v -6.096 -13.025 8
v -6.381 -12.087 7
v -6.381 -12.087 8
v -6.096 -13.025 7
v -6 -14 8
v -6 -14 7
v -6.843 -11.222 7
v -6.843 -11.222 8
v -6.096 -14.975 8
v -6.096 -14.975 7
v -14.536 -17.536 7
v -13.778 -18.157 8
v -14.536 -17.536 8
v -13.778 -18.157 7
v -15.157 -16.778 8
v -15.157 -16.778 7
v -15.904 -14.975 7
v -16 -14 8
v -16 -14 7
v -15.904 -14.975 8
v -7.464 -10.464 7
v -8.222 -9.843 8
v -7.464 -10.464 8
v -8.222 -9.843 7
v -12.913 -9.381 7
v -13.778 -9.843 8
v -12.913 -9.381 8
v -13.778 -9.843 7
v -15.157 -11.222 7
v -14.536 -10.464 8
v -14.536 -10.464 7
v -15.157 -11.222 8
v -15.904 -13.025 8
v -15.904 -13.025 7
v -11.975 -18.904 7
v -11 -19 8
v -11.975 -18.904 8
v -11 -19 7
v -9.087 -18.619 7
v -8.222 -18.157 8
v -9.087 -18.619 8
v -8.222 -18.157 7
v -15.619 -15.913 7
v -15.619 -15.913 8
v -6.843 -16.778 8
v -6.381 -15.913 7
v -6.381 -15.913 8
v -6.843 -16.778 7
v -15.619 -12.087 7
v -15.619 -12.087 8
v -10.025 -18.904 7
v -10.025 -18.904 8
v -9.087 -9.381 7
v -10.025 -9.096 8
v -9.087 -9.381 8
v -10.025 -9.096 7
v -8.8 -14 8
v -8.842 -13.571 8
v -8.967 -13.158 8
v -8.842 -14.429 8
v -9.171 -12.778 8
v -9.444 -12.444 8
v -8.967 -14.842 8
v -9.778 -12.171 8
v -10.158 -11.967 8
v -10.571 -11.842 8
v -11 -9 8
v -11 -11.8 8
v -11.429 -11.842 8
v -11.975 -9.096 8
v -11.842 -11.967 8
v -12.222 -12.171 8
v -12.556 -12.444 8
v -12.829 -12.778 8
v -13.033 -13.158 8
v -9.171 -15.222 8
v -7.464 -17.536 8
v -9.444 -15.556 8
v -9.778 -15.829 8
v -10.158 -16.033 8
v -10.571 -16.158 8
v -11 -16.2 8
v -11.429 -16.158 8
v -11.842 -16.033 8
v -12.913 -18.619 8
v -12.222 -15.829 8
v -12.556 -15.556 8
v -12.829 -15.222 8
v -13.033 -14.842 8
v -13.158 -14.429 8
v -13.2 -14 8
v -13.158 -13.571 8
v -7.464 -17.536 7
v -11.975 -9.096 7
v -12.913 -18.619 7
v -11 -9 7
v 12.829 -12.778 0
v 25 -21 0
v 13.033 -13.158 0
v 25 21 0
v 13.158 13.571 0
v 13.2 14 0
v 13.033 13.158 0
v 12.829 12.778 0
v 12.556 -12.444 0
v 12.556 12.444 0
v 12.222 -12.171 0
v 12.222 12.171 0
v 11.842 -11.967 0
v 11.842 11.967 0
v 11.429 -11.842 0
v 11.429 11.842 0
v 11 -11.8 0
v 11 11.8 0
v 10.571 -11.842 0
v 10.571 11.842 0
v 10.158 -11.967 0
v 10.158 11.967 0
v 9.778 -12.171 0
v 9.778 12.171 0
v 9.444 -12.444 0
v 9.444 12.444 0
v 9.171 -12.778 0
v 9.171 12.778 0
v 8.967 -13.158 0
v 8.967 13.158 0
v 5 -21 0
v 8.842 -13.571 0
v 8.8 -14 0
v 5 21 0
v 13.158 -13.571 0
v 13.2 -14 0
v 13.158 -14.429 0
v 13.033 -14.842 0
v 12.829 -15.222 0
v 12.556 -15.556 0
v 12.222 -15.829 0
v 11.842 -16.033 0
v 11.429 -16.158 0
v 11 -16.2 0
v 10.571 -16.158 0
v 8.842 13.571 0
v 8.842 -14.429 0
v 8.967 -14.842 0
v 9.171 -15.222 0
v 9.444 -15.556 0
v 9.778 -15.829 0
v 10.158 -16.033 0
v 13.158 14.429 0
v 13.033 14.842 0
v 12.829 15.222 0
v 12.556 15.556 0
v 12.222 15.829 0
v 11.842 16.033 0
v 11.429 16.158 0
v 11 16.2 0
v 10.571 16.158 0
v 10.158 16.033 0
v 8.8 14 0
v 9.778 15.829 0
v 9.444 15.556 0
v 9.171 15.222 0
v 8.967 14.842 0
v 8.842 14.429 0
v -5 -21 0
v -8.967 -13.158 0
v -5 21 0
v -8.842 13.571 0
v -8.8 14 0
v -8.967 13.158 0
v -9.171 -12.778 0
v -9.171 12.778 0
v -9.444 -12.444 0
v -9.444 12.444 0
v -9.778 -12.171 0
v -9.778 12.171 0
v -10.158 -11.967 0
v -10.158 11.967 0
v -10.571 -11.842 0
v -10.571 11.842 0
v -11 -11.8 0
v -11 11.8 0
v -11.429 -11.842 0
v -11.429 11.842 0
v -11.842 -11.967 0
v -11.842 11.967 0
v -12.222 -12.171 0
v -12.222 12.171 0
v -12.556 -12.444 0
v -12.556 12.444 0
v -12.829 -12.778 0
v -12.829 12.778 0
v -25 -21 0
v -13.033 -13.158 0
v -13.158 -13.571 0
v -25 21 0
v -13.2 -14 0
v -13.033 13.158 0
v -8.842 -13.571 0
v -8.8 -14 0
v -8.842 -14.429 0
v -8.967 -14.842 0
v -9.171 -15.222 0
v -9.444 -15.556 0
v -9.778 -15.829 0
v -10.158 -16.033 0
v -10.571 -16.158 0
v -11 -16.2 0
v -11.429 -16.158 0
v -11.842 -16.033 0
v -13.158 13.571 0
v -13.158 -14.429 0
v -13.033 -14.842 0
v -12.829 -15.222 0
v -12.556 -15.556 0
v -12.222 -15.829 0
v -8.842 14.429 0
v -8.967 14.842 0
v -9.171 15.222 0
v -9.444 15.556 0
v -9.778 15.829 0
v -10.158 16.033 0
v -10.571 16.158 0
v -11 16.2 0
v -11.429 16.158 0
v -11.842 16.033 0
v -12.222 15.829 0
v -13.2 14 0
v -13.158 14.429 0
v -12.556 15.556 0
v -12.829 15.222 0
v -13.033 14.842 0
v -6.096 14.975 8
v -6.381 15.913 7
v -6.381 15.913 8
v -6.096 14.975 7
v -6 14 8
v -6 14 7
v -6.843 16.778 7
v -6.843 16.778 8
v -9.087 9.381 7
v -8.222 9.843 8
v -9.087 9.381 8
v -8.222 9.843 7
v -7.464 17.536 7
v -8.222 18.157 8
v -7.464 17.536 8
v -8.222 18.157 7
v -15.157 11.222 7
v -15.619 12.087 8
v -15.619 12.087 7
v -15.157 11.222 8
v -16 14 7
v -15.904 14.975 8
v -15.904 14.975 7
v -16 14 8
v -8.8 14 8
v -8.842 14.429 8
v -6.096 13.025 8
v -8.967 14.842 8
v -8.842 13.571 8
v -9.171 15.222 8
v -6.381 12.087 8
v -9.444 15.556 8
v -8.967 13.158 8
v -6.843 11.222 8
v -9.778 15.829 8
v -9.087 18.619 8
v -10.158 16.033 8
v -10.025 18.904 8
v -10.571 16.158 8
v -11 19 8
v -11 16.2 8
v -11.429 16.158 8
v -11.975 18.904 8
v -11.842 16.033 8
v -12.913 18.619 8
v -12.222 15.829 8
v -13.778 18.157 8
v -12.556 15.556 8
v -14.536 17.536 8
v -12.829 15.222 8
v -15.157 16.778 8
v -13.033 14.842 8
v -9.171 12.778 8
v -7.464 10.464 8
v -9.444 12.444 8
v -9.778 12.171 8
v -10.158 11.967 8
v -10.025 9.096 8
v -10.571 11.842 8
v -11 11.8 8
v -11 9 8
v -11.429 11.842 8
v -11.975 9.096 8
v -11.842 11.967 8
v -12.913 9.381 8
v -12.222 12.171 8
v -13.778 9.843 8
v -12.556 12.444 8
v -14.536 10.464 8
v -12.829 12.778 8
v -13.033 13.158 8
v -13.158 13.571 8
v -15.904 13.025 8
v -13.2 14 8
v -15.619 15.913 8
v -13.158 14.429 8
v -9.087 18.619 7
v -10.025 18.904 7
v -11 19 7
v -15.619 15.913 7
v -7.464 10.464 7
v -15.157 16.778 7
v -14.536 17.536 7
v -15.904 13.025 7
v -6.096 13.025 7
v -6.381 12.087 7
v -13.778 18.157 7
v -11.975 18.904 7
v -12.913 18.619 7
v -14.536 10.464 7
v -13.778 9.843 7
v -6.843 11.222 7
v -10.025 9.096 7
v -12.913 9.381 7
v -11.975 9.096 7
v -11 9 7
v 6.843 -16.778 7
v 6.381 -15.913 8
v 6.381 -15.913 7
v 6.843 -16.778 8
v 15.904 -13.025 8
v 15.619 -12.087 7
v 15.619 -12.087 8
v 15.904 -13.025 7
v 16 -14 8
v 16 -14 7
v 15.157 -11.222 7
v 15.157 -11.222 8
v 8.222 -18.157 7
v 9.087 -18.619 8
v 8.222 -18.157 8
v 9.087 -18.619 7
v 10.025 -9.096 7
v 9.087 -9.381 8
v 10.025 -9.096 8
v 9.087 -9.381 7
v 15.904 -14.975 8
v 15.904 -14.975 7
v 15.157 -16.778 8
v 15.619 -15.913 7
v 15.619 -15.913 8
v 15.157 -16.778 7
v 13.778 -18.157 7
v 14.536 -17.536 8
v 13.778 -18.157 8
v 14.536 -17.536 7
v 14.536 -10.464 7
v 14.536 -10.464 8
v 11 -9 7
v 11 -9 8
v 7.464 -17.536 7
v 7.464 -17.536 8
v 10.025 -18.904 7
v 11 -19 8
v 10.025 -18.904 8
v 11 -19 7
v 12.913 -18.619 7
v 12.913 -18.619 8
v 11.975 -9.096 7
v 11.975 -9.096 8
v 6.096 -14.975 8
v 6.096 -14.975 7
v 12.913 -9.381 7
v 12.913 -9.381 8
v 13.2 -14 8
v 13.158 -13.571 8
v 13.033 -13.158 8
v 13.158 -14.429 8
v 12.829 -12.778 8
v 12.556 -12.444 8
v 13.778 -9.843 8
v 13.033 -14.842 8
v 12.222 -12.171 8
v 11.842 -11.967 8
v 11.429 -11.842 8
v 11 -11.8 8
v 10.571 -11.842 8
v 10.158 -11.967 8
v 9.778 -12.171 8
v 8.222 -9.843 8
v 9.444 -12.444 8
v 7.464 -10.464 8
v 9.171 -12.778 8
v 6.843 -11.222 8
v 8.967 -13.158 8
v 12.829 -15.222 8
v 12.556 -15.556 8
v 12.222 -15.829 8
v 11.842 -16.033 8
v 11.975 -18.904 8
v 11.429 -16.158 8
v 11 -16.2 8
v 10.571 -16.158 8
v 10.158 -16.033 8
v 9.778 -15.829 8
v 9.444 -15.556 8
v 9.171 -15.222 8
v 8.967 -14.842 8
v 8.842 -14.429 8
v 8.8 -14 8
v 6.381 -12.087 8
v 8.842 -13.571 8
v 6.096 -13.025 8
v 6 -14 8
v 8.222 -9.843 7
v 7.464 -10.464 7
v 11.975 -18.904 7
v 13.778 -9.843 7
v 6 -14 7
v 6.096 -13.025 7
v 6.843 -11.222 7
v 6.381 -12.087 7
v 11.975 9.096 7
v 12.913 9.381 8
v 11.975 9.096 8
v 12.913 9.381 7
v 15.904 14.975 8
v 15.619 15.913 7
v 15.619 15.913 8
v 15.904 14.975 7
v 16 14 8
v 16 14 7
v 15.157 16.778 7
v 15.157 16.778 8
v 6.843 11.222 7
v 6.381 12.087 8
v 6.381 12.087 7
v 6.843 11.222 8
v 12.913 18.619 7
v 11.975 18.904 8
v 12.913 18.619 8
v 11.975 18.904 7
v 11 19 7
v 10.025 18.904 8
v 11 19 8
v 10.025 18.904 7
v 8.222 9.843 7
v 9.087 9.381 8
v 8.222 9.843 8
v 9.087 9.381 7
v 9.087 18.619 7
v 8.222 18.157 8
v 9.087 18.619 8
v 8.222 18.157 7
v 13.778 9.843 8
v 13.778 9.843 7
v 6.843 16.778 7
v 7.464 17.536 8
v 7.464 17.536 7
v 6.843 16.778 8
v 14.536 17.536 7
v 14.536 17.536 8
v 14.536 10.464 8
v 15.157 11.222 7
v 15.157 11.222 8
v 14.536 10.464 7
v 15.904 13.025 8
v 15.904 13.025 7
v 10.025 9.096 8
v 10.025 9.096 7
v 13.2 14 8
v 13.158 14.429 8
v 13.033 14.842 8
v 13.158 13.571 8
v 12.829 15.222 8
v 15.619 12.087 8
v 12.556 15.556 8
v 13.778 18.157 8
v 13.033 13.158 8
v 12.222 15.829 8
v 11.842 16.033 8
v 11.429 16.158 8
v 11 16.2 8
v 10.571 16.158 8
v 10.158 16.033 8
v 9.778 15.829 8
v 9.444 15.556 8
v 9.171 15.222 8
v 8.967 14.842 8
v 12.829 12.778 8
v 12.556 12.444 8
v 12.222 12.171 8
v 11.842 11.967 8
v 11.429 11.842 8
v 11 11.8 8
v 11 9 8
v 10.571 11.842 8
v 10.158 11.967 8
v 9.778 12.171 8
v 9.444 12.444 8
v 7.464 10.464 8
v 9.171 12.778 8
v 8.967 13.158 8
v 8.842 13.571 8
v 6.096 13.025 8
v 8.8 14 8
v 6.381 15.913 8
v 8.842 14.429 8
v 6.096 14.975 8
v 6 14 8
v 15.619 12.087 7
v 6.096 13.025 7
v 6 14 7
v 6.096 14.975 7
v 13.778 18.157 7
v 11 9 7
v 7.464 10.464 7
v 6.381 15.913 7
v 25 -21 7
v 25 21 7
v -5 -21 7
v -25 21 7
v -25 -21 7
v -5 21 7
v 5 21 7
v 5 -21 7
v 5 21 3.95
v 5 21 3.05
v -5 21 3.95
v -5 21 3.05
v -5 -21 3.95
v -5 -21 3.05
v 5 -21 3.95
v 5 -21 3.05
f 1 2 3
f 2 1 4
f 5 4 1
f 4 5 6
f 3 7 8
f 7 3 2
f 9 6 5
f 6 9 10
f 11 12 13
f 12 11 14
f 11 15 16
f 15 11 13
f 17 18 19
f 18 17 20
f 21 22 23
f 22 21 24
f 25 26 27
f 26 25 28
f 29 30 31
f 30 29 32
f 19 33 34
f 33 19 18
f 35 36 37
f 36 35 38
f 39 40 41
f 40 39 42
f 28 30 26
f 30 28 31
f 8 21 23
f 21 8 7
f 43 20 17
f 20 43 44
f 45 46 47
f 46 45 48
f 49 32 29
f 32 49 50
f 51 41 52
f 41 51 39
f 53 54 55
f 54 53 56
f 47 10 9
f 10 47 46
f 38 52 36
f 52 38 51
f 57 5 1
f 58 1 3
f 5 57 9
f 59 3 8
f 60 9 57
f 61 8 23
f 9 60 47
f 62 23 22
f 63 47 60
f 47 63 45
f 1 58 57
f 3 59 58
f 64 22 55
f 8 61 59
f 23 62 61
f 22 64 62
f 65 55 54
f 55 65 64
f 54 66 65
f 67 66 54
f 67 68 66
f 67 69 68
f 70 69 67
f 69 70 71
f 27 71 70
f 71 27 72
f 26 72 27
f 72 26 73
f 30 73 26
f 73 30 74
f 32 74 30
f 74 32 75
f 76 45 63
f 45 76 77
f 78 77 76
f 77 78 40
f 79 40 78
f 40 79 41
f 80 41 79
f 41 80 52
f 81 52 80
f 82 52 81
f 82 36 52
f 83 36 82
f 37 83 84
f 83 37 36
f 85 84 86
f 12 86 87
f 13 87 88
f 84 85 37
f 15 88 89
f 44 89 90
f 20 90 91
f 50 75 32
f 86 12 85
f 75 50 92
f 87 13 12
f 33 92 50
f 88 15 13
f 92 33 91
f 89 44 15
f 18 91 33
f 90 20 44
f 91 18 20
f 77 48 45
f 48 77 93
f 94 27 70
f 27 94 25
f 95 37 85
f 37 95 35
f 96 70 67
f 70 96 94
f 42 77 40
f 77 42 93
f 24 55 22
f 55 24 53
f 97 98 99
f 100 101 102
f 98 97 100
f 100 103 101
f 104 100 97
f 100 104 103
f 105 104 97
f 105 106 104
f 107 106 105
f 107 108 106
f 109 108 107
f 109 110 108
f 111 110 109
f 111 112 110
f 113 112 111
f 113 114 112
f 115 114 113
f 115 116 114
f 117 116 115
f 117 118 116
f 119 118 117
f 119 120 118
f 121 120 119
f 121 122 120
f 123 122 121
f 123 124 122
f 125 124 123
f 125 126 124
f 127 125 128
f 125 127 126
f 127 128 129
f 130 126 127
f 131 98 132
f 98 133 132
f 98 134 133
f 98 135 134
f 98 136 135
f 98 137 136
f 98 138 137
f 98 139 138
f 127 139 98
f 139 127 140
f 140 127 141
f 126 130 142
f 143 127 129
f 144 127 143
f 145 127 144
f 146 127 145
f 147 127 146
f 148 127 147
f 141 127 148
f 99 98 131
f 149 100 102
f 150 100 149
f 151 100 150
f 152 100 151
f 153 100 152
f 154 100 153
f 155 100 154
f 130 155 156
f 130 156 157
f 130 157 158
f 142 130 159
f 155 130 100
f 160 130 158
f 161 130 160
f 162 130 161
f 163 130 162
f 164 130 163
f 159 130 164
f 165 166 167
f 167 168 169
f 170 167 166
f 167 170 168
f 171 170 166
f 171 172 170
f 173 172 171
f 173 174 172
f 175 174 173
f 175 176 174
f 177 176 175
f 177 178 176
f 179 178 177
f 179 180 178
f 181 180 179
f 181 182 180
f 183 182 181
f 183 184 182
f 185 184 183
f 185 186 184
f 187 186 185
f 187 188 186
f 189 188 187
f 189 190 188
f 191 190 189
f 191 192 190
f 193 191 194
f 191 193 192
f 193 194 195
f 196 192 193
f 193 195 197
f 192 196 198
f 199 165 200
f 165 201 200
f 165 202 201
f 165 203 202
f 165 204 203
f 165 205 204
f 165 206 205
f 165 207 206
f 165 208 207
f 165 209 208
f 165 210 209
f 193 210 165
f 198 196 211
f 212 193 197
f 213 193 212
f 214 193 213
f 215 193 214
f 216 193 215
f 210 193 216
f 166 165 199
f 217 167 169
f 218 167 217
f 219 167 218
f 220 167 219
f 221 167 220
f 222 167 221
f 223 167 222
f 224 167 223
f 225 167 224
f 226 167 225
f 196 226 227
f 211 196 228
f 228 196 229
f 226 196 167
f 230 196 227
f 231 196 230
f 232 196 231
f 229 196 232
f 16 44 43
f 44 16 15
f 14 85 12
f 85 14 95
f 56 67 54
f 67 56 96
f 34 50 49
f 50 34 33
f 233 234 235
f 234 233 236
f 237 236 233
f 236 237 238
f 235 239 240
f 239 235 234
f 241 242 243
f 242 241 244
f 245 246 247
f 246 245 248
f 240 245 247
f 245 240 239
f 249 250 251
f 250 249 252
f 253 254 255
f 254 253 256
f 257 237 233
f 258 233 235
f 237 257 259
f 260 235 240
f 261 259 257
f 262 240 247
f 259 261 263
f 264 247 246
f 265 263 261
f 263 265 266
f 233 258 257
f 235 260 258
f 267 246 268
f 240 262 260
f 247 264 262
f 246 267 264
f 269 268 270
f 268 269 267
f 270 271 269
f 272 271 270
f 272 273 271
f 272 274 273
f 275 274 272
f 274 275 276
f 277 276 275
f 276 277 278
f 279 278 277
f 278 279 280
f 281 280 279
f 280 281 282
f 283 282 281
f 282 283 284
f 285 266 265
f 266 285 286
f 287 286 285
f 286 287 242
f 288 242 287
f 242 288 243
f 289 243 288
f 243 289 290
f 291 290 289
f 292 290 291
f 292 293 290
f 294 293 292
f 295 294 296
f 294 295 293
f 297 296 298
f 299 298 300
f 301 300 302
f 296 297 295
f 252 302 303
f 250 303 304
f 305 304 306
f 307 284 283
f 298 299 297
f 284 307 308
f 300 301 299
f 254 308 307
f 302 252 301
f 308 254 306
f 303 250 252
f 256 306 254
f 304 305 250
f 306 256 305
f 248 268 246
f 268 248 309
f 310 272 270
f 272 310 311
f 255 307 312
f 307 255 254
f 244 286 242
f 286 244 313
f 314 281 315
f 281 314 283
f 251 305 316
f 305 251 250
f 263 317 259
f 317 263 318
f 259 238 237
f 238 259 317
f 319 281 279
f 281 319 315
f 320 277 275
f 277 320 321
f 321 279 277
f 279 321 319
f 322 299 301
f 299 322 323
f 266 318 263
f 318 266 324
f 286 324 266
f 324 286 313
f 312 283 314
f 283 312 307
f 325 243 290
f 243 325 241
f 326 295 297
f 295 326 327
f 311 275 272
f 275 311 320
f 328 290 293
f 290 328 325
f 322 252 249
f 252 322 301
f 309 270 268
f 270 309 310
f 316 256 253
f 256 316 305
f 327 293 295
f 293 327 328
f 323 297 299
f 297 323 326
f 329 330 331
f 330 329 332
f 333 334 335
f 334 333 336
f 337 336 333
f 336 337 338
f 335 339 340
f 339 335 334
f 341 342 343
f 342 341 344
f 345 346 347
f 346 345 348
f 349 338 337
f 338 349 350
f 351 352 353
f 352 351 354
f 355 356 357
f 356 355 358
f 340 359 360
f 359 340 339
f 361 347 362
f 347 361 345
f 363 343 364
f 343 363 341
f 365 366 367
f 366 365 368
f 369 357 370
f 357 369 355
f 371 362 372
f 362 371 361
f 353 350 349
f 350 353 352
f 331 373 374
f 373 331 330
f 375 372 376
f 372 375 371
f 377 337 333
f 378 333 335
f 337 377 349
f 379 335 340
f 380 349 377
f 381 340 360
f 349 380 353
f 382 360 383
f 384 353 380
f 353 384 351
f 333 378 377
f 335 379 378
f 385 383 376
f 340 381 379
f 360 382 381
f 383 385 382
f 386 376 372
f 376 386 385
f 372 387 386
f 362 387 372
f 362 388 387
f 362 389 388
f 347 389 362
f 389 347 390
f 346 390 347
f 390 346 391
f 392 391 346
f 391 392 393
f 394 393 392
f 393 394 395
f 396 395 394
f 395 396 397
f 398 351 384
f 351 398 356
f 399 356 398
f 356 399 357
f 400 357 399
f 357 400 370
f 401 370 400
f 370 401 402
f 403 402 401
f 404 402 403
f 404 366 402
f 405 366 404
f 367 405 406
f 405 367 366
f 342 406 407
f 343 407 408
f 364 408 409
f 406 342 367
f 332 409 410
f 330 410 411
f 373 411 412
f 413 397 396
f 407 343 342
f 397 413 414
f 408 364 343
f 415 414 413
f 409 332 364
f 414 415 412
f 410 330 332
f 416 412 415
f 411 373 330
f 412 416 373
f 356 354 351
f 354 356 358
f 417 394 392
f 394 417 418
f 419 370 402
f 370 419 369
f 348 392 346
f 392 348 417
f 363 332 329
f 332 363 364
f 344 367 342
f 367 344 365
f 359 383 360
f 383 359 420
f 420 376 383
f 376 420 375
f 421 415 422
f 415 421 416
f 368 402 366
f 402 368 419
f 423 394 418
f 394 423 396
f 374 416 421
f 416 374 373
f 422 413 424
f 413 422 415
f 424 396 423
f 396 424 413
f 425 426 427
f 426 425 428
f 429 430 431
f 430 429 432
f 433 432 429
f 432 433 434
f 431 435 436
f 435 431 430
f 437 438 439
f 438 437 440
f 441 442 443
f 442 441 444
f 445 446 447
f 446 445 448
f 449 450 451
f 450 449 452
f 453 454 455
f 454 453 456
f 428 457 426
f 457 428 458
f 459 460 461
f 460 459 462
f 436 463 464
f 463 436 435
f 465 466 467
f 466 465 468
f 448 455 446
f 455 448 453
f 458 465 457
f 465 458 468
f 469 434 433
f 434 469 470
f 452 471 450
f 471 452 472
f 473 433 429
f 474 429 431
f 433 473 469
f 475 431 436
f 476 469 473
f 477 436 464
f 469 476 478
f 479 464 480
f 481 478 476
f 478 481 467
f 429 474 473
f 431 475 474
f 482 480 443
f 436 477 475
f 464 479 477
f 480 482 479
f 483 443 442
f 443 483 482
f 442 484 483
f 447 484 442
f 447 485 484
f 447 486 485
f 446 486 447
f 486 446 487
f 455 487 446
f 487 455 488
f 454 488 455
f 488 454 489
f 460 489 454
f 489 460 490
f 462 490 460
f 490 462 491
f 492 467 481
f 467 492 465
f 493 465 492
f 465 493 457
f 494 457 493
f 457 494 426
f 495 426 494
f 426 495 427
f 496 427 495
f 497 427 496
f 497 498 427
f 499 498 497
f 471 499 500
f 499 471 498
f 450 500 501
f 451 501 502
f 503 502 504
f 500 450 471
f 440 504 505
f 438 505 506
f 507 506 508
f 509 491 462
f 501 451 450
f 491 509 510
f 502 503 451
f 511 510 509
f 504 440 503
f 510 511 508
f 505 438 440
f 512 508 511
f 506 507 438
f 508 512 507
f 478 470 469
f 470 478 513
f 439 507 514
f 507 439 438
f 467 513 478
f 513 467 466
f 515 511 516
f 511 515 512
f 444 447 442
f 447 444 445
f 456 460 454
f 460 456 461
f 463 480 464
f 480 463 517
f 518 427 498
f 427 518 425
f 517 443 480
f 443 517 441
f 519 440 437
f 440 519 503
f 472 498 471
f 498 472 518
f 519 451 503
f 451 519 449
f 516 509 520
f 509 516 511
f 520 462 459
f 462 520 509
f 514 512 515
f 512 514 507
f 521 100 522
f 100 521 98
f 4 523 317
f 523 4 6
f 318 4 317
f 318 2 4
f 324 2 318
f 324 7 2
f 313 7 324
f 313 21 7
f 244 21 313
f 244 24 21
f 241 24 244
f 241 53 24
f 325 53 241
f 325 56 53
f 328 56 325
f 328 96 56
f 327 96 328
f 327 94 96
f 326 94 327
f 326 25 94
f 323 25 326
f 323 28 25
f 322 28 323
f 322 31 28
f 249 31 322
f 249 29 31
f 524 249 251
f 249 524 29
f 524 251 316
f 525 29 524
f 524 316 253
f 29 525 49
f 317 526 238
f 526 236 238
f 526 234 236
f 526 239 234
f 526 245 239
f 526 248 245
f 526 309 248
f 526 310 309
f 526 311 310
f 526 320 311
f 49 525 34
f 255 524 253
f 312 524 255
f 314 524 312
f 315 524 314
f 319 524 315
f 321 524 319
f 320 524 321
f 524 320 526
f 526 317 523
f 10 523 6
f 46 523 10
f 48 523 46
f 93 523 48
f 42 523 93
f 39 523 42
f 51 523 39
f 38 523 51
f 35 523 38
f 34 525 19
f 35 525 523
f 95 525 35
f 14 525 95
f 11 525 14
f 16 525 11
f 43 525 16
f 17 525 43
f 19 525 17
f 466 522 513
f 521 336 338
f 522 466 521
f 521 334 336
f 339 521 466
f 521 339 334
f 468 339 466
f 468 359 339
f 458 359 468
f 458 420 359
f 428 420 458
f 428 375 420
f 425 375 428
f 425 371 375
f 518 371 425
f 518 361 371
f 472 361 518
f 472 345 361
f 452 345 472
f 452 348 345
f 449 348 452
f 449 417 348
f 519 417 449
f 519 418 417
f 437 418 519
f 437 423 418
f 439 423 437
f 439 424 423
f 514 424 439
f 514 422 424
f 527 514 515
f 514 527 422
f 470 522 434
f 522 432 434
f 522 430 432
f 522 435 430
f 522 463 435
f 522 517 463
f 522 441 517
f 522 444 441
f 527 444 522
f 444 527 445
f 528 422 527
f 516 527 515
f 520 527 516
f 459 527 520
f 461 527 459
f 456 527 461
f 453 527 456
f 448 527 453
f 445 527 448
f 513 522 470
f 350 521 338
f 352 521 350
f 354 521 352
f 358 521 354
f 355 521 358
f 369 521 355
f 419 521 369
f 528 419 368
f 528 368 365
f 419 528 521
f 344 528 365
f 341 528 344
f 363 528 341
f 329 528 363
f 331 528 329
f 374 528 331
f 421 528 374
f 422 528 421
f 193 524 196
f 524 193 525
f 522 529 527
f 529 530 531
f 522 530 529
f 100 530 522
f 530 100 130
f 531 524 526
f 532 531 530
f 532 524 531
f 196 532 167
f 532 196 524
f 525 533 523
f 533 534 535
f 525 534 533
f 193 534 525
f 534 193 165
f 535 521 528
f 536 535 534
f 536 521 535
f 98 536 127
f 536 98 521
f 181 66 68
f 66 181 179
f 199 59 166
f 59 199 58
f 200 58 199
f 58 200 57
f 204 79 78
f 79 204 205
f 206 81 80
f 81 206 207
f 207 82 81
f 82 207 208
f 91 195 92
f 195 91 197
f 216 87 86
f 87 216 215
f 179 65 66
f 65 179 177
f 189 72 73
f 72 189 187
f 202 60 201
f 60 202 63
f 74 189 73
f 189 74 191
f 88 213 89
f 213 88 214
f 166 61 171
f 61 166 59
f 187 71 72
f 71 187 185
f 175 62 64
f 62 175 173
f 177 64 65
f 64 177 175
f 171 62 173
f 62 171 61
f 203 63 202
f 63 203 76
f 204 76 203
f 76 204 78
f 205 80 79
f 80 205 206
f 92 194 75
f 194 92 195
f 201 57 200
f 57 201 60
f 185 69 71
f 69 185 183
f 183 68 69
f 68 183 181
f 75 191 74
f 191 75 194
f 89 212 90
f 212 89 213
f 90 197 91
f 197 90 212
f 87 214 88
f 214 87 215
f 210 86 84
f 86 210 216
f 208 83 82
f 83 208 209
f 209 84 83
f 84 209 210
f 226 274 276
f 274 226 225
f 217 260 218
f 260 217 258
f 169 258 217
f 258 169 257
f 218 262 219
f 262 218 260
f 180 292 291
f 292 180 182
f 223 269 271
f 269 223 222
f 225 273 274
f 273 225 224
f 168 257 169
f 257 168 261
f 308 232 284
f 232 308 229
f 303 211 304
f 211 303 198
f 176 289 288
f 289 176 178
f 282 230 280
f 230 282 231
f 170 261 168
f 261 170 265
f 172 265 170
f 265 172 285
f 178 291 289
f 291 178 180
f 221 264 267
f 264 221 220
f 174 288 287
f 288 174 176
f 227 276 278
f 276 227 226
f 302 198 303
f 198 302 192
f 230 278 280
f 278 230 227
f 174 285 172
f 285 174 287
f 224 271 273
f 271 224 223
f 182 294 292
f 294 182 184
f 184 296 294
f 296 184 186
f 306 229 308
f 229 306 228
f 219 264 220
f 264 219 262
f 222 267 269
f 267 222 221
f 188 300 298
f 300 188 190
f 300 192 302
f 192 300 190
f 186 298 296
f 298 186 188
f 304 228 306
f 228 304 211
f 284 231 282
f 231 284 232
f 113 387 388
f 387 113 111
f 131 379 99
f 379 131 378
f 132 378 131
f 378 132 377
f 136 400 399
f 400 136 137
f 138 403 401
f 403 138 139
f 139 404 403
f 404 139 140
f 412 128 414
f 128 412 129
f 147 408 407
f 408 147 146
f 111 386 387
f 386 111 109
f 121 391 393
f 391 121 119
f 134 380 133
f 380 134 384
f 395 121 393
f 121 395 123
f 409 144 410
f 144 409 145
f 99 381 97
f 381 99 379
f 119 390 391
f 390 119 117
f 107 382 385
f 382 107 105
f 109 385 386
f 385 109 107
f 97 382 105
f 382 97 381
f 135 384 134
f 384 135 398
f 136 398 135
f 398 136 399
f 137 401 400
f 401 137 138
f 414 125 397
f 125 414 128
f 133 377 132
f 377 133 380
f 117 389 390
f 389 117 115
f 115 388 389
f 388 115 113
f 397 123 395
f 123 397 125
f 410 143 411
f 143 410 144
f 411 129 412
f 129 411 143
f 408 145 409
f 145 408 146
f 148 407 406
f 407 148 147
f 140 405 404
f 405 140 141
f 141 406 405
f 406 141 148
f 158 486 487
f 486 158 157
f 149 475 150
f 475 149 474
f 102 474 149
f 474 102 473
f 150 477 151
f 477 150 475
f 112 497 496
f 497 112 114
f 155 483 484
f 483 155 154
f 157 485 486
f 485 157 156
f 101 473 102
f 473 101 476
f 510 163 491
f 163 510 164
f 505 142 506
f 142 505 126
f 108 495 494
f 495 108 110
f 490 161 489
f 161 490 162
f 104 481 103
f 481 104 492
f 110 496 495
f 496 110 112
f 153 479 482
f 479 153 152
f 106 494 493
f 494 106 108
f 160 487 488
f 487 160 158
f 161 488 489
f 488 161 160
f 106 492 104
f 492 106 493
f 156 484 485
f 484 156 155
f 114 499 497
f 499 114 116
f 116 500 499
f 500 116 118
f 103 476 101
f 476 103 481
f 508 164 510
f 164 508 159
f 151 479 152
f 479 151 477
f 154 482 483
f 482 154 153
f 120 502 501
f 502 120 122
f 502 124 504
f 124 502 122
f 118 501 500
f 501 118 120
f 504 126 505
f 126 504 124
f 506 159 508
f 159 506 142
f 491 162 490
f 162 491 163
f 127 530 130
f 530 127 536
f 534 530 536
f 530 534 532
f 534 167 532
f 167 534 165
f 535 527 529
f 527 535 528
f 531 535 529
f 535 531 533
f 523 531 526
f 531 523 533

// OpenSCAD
$fn = 32;

// ----------------------------------------------------------------------
// Living hinge: 50 x 42 mm plates, 0.9 mm flexible web
// ----------------------------------------------------------------------

// --- parameters (mm) ---
plate_len = 20;           // plate length outside the web
plate_w = 42;             // plate width
thick = 7;                // plate thickness
web_half = 5;             // half width of the flex band
web_t = 0.9;              // flexible web thickness
web_z = 3.05;             // web position inside the thickness
boss_d = 10;              // screw boss diameter
boss_h = 8;               // screw boss height
boss_x = 11;              // screw boss distance from the web
screw_d = 4.4;            // screw hole

difference() {
  union() {
    /* one flat strip, later thinned at the middle */
    translate([-25, -21, 0]) cube([50, 42, 7]);
    /* screw bosses, sunk 0.5 mm into the plates */
    for (sx = [-11, 11]) {
      for (sy = [-14, 14]) {
        translate([sx, sy, 0]) cylinder(h = boss_h, d = boss_d);
      }
    }
  }
  /* channel from below: leaves the web on top of it */
  translate([-5, -23.5, -2.5]) cube([10, 47, 5.55]);
  /* channel from above: thins the web down to web_t */
  translate([-5, -23.5, 3.95]) cube([10, 47, 5.55]);
  /* screw holes through the bosses */
  for (sx = [-11, 11]) {
    for (sy = [-14, 14]) {
      translate([sx, sy, -2.5]) cylinder(h = boss_h + 5, d = screw_d);
    }
  }
}
